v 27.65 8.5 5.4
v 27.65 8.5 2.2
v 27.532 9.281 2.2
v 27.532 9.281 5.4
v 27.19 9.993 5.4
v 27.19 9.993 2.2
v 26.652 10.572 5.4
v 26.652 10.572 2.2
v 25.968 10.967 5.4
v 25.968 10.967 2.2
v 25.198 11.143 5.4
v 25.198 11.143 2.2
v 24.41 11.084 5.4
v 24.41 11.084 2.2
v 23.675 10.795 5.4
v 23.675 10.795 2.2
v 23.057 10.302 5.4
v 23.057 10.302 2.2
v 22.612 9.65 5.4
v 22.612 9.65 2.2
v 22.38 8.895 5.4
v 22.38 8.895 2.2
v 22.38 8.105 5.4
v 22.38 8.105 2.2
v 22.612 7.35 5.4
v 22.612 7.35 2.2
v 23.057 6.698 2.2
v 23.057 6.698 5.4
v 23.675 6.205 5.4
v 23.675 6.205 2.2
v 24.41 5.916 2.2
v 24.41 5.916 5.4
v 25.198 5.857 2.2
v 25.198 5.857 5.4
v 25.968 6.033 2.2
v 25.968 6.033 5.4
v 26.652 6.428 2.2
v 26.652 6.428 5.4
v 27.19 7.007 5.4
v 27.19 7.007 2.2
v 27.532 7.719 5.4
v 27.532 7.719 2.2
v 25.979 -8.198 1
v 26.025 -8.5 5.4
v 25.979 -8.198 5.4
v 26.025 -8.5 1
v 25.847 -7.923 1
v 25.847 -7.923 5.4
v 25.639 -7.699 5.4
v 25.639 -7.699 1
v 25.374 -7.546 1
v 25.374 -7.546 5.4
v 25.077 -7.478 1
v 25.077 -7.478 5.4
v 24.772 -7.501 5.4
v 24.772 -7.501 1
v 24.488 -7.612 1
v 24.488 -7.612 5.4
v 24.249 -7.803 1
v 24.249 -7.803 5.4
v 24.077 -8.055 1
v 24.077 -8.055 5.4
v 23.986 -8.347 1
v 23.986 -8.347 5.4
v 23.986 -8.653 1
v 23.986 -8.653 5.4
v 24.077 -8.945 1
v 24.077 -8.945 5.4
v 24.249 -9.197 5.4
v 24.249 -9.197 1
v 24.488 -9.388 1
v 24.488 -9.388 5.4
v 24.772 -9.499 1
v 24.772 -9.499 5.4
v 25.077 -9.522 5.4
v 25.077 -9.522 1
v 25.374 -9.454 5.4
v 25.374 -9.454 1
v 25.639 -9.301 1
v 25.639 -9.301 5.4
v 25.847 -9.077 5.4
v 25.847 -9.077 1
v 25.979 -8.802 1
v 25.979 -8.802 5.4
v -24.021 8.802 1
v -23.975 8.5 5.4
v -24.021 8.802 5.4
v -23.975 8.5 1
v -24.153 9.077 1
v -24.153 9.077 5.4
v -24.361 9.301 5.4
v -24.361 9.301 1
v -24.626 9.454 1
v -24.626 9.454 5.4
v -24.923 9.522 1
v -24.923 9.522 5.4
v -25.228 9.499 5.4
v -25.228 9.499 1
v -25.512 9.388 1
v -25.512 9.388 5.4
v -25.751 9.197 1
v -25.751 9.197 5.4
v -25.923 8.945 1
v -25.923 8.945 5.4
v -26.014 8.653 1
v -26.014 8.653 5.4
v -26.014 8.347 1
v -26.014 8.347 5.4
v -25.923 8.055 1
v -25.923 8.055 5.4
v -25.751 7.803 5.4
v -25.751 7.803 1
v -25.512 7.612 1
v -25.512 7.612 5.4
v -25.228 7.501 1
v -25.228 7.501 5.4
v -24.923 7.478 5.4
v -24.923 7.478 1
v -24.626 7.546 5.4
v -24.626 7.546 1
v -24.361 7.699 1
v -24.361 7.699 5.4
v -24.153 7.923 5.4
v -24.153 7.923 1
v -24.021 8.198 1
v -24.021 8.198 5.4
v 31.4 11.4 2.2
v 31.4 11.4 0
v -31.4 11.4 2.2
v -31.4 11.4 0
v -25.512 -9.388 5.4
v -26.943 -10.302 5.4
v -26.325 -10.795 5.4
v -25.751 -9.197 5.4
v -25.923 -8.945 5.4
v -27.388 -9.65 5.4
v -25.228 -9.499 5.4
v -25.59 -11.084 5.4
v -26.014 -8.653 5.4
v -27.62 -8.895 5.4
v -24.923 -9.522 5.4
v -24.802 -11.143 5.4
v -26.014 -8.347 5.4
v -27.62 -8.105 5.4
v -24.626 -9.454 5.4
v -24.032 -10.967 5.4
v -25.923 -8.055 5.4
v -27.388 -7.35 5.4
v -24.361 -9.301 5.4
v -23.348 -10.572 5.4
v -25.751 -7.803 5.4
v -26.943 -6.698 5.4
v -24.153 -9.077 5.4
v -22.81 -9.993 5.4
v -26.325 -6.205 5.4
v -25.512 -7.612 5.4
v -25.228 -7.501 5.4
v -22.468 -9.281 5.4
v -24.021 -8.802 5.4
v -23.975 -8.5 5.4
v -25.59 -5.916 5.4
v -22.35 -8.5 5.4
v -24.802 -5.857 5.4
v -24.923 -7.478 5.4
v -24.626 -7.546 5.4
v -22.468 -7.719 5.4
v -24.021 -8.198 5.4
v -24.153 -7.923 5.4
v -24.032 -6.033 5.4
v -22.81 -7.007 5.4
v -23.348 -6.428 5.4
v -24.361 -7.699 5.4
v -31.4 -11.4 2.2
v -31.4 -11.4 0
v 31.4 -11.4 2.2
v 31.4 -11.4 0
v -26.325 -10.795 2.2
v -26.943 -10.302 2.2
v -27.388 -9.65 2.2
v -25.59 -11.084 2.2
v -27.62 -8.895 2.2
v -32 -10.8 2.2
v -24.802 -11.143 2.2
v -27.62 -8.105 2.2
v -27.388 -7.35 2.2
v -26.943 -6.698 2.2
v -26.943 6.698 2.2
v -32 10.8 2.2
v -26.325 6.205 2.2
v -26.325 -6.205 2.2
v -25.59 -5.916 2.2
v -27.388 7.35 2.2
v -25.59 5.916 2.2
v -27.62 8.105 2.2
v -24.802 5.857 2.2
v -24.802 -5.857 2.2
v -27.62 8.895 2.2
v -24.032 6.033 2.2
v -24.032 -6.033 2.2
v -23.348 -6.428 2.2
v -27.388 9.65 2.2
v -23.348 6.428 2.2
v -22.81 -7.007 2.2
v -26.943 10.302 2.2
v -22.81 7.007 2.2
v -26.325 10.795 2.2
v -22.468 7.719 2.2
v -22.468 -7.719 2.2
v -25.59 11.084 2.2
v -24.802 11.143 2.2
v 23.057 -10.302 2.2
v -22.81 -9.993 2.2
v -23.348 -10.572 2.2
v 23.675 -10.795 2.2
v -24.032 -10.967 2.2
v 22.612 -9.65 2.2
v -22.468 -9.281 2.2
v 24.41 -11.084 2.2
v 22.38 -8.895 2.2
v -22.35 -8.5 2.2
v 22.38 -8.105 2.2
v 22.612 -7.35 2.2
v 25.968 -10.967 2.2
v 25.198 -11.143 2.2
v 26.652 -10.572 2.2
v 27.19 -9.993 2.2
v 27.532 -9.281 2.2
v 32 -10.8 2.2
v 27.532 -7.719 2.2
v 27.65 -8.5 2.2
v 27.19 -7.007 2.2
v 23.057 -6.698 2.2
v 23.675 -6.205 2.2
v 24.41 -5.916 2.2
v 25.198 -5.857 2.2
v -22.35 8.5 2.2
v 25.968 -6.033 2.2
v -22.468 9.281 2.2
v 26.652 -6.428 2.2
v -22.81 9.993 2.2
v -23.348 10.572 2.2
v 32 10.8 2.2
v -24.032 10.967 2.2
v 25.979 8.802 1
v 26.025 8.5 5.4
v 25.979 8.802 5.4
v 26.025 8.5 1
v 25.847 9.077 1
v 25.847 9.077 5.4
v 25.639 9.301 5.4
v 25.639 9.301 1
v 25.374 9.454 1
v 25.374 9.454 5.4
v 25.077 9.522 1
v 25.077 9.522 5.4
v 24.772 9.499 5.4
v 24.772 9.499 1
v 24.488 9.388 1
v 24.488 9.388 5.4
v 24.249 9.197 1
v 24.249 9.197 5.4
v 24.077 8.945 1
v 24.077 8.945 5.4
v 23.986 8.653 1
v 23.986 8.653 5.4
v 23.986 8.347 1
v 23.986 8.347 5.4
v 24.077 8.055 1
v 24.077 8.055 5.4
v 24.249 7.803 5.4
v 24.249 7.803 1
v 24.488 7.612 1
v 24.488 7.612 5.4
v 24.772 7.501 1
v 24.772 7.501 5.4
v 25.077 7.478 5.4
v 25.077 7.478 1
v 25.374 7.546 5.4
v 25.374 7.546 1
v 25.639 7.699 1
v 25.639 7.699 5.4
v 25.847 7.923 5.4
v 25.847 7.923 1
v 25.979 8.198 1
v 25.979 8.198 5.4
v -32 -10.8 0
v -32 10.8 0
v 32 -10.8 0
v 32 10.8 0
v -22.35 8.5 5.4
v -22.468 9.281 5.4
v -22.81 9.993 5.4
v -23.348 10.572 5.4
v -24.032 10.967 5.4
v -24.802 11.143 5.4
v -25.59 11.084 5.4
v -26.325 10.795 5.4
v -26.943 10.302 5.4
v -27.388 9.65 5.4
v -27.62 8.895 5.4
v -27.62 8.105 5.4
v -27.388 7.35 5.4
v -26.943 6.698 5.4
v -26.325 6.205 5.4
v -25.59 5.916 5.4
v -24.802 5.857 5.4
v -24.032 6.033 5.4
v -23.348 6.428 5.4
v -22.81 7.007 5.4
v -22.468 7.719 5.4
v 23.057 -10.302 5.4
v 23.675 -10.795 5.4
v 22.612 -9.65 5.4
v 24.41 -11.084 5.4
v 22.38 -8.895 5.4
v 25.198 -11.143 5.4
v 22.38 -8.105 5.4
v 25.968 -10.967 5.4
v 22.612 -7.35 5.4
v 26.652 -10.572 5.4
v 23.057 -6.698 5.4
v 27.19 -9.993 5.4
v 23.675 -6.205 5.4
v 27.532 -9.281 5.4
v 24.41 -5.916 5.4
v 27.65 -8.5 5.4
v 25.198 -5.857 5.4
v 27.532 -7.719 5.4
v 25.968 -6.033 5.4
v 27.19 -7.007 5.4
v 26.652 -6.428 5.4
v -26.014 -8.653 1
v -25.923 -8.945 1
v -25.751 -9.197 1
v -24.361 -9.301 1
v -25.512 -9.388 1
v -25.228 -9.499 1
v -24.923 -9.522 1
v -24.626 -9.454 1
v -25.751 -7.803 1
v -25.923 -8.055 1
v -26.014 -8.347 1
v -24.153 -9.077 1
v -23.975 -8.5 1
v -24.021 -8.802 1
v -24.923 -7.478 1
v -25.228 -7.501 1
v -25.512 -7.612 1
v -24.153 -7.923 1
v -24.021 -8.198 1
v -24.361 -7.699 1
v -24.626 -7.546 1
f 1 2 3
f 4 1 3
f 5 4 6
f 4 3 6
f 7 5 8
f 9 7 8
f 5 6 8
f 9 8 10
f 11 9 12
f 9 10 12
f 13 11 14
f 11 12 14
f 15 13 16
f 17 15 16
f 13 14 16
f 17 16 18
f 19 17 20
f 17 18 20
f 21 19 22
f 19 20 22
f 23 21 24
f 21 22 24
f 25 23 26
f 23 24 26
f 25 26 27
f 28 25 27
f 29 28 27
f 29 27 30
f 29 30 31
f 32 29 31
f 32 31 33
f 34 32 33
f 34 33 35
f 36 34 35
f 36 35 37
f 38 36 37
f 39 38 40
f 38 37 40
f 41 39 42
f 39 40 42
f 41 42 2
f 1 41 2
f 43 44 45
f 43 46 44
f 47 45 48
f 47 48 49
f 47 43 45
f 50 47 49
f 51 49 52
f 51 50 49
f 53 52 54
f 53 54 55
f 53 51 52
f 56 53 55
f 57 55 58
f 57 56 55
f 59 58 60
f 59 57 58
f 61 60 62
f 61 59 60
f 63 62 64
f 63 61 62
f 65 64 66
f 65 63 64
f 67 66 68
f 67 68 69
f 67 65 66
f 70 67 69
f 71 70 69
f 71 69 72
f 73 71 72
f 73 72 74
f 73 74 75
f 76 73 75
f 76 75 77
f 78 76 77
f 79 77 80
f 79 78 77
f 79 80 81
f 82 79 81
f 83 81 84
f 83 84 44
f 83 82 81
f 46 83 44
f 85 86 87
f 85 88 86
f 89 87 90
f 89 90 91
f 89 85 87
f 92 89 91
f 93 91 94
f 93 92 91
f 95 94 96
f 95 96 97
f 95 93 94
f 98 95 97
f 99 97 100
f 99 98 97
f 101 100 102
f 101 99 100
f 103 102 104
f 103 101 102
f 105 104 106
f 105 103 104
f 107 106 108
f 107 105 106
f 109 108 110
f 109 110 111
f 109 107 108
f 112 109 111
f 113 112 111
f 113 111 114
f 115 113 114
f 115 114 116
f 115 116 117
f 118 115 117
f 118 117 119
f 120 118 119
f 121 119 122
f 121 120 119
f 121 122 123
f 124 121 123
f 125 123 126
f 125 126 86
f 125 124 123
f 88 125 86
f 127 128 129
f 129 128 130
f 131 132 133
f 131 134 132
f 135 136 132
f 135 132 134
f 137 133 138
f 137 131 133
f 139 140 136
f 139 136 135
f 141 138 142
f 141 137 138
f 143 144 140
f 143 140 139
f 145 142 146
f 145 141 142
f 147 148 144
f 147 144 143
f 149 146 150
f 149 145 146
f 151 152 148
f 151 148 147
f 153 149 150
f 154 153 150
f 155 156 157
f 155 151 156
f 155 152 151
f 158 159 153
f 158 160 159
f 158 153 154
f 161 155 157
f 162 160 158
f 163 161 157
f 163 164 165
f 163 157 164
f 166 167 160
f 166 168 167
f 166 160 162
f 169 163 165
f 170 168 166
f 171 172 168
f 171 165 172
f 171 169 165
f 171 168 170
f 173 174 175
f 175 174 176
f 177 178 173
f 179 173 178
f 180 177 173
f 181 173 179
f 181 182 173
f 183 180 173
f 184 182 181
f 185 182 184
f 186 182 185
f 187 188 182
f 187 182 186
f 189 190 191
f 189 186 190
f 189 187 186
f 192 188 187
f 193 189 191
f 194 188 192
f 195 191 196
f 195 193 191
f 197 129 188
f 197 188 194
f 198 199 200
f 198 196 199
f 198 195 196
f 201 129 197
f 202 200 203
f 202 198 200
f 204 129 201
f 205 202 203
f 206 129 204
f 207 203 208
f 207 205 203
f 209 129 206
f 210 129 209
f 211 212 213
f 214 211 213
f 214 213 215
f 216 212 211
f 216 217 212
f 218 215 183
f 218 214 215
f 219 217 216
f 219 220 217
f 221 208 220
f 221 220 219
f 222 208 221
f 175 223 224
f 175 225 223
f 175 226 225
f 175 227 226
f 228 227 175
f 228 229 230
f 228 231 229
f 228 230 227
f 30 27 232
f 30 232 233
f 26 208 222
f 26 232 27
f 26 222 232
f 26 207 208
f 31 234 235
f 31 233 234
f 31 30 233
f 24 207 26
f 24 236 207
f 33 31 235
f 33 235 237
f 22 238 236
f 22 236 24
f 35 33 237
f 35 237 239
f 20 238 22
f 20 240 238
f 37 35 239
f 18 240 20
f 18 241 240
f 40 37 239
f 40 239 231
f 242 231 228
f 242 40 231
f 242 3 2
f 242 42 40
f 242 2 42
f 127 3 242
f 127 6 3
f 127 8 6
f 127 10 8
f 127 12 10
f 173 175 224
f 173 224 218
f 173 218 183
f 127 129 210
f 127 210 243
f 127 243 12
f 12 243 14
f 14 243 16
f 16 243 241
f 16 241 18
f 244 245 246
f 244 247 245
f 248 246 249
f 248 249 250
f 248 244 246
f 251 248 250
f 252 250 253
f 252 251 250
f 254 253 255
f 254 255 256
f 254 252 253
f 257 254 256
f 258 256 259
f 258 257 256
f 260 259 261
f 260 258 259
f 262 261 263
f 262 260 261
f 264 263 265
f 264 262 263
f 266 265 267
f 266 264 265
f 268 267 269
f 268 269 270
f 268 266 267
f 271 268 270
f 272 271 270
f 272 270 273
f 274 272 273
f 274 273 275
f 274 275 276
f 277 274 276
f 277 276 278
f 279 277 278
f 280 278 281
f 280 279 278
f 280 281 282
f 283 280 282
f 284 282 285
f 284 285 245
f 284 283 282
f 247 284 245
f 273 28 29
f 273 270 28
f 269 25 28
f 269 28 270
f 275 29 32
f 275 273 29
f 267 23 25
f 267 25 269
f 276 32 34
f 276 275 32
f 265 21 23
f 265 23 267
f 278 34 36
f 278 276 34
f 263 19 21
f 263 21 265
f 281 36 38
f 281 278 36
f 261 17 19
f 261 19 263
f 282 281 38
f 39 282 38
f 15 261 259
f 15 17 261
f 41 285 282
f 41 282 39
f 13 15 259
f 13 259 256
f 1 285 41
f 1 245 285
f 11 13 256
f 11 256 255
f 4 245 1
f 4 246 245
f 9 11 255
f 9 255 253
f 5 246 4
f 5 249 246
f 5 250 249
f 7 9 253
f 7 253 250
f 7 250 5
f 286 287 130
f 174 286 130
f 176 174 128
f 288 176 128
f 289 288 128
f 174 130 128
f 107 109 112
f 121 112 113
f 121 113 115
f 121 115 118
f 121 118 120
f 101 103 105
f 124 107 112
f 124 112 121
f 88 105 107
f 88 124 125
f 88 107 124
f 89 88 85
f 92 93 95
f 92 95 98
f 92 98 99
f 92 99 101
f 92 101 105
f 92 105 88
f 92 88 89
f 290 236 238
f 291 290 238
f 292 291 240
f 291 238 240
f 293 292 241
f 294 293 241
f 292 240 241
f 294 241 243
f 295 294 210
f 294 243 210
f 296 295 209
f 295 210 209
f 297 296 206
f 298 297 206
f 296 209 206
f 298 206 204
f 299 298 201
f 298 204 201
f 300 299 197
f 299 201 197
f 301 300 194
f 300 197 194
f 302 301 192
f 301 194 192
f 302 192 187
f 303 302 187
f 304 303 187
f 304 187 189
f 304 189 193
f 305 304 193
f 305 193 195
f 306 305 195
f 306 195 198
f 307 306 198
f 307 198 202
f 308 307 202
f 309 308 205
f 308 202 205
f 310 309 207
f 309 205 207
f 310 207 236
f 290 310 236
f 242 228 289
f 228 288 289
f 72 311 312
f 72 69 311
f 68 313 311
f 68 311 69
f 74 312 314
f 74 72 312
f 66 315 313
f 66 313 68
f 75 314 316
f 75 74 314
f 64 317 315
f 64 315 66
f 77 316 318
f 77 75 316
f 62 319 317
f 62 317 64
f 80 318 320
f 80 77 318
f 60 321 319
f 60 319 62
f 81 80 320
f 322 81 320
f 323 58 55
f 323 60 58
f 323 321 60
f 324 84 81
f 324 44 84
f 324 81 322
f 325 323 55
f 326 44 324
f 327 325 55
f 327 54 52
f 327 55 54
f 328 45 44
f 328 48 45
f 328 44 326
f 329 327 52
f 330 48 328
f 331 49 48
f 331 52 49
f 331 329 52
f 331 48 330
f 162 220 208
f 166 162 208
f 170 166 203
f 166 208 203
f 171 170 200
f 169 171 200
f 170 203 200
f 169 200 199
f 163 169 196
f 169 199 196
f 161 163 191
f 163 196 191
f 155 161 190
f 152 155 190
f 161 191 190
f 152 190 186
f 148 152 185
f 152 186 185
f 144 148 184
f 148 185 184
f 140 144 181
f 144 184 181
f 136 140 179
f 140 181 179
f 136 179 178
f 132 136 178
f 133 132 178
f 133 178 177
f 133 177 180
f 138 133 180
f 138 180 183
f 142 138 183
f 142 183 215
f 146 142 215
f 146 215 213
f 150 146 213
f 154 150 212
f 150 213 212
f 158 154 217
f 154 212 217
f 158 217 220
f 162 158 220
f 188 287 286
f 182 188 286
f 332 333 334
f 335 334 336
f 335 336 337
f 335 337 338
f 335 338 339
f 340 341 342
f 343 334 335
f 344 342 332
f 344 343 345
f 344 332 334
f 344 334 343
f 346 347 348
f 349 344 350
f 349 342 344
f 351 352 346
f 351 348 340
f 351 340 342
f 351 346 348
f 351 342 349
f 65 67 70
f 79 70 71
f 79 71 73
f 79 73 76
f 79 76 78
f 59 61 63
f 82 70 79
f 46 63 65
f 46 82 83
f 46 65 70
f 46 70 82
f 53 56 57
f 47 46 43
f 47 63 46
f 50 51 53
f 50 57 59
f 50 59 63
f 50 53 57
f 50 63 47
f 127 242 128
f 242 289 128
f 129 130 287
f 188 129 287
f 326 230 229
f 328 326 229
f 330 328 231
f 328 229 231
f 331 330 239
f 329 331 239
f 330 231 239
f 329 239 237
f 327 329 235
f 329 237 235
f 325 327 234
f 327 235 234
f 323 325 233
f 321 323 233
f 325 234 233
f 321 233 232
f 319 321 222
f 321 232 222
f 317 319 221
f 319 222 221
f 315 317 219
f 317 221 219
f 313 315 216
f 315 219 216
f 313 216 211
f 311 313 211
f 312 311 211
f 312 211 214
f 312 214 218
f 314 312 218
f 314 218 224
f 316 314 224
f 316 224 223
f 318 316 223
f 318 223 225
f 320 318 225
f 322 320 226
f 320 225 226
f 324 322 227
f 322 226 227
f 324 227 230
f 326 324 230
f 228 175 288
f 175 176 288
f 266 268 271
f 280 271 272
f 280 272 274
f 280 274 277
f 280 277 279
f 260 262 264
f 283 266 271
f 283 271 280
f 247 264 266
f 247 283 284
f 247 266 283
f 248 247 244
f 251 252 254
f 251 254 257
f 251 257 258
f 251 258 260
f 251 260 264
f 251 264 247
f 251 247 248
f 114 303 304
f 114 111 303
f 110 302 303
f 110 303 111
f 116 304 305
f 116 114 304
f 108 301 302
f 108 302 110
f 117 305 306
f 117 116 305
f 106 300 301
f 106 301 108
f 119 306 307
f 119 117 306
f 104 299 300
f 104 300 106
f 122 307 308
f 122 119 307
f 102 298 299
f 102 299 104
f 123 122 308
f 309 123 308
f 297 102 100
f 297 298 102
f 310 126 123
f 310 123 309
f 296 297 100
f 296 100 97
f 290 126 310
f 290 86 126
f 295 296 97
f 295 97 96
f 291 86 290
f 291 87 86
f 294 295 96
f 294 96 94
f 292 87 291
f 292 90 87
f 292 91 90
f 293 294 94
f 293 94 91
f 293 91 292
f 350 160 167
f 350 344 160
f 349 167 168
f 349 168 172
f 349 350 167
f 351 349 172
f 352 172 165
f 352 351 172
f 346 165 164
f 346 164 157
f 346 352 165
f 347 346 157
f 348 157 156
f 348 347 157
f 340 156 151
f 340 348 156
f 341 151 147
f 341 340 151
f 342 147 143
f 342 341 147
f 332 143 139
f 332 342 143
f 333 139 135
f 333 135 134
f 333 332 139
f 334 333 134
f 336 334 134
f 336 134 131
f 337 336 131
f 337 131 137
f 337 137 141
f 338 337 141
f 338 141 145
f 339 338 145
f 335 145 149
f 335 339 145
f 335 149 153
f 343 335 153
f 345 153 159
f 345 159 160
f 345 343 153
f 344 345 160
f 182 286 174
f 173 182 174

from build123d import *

# Parameters (mm, degrees)
FLAT_BACK_OF_SEPARATELY_PRINTED_SLIDE_IN_DEPTH = 1
PLATE_START                                    = 1
PLATE_RIM_WITH_BLIND_D2_05_PILOT_BOT_2_R       = 1.025
PLATE_RIM_WITH_BLIND_D2_05_PILOT_BOTTOMS_DEPTH = 1.2
RAISED_START                                   = 2.2
RAISED_POWER_BOARD_SUPPORTS_NO_NUT_2_R         = 2.65
RAISED_POWER_BOARD_SUPPORTS_NO_NUT_2_R_2       = 1.025
RAISED_POWER_BOARD_SUPPORTS_NO_NUTS_BE_DEPTH   = 3.2


with BuildPart() as part:
    # Flat back of separately printed slid 2 → Flat back of separately printed slide-in (new body)
    with BuildSketch(Plane.XY):
        Polygon((-31.4, -11.4), (31.4, -11.4), (32, -10.8), (32, 10.8), (31.4, 11.4), (-31.4, 11.4), (-32, 10.8), (-32, -10.8), align=None)
    extrude(amount=FLAT_BACK_OF_SEPARATELY_PRINTED_SLIDE_IN_DEPTH)

    # Plate rim with blind D2.05 pilot bot 2 → Plate rim with blind D2.05 pilot bottoms (add)
    with BuildSketch(Plane.XY.offset(PLATE_START)):
        Polygon((-31.4, -11.4), (31.4, -11.4), (32, -10.8), (32, 10.8), (31.4, 11.4), (-31.4, 11.4), (-32, 10.8), (-32, -10.8), align=None)
        with Locations((-25, -8.5)):
            Circle(PLATE_RIM_WITH_BLIND_D2_05_PILOT_BOT_2_R, mode=Mode.SUBTRACT)
        with Locations((-25, 8.5)):
            Circle(PLATE_RIM_WITH_BLIND_D2_05_PILOT_BOT_2_R, mode=Mode.SUBTRACT)
        with Locations((25, -8.5)):
            Circle(PLATE_RIM_WITH_BLIND_D2_05_PILOT_BOT_2_R, mode=Mode.SUBTRACT)
        with Locations((25, 8.5)):
            Circle(PLATE_RIM_WITH_BLIND_D2_05_PILOT_BOT_2_R, mode=Mode.SUBTRACT)
    extrude(amount=PLATE_RIM_WITH_BLIND_D2_05_PILOT_BOTTOMS_DEPTH)

    # Raised power board supports - no nut 2 → Raised power board supports - no nuts be (add)
    # profile 1 of 4: a face of its own
    with BuildSketch(Plane.XY.offset(RAISED_START)):
        with Locations((-25, -8.5)):
            Circle(RAISED_POWER_BOARD_SUPPORTS_NO_NUT_2_R)
        with Locations((-25, -8.5)):
            Circle(RAISED_POWER_BOARD_SUPPORTS_NO_NUT_2_R_2, mode=Mode.SUBTRACT)
    # profile 2 of 4: a face of its own
    with BuildSketch(Plane.XY.offset(RAISED_START)):
        with Locations((-25, 8.5)):
            Circle(RAISED_POWER_BOARD_SUPPORTS_NO_NUT_2_R)
        with Locations((-25, 8.5)):
            Circle(RAISED_POWER_BOARD_SUPPORTS_NO_NUT_2_R_2, mode=Mode.SUBTRACT)
    # profile 3 of 4: a face of its own
    with BuildSketch(Plane.XY.offset(RAISED_START)):
        with Locations((25, -8.5)):
            Circle(RAISED_POWER_BOARD_SUPPORTS_NO_NUT_2_R)
        with Locations((25, -8.5)):
            Circle(RAISED_POWER_BOARD_SUPPORTS_NO_NUT_2_R_2, mode=Mode.SUBTRACT)
    # profile 4 of 4: a face of its own
    with BuildSketch(Plane.XY.offset(RAISED_START)):
        with Locations((25, 8.5)):
            Circle(RAISED_POWER_BOARD_SUPPORTS_NO_NUT_2_R)
        with Locations((25, 8.5)):
            Circle(RAISED_POWER_BOARD_SUPPORTS_NO_NUT_2_R_2, mode=Mode.SUBTRACT)
    extrude(amount=RAISED_POWER_BOARD_SUPPORTS_NO_NUTS_BE_DEPTH)


solid = part.part
